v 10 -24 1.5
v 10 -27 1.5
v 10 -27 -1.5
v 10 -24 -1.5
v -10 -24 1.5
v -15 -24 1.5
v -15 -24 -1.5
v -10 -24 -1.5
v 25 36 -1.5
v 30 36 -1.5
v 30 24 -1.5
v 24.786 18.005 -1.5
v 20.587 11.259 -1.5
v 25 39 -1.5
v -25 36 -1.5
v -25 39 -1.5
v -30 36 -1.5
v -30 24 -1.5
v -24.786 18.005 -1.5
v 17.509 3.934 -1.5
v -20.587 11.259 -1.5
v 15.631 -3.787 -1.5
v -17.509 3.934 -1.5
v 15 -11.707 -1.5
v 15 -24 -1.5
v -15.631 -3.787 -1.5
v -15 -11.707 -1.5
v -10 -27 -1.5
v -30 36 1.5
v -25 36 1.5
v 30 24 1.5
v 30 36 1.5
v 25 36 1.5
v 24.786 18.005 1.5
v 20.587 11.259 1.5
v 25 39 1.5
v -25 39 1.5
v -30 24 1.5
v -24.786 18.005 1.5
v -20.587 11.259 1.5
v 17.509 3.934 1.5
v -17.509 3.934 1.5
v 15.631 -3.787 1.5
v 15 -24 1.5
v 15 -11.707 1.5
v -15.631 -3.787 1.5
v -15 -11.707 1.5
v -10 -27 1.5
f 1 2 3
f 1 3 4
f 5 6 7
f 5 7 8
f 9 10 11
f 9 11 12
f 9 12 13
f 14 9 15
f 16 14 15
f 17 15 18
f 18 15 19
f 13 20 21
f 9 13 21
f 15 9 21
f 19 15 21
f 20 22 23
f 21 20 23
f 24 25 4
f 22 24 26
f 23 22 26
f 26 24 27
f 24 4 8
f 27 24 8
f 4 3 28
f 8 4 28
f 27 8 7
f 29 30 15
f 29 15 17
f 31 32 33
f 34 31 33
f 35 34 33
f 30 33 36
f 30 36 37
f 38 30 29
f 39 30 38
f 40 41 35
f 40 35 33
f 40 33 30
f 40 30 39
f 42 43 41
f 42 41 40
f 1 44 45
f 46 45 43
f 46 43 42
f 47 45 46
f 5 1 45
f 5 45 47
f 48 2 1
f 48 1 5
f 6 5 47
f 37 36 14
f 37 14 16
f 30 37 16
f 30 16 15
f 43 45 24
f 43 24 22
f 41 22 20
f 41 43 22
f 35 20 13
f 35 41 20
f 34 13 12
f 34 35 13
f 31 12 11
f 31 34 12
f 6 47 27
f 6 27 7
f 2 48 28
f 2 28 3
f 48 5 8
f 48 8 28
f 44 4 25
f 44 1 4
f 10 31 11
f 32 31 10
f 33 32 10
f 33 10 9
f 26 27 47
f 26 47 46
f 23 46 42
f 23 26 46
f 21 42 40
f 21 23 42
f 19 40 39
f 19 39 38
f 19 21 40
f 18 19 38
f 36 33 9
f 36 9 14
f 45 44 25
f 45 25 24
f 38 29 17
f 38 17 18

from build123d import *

# Parameters (mm, degrees)
BOSS_EXTRUDE1_DEPTH = 1.5
FILLET1_R           = 50


with BuildPart() as part:
    # Sketch2 → Boss-Extrude1 (new, symmetric)
    with BuildSketch(Plane.XY):
        Polygon((15, 24), (30, 24), (30, 36), (25, 36), (25, 39), (-25, 39), (-25, 36), (-30, 36), (-30, 24), (-15, 24), (-15, -24), (-10, -24), (-10, -27), (10, -27), (10, -24), (15, -24), align=None)
    extrude(amount=BOSS_EXTRUDE1_DEPTH, both=True)

    # Fillet1
    # the kernel refuses this fillet: 50 mm, written as the material it adds along each edge
    with BuildSketch(Plane(origin=(-15, 24, -1.5), x_dir=(0, -1, 0), z_dir=(0, 0, 1))) as fillet1_piece_1:
        with BuildLine():
            CenterArc((35.707142143, -50), FILLET1_R, 90, 45.572995999)
            Line((0, -15), (0, 0))
            Line((0, 0), (35.707142143, 0))
        make_face()
    extrude(amount=3)
    with BuildSketch(Plane(origin=(15, 24, 1.5), x_dir=(1, 0, 0), z_dir=(0, 0, -1))) as fillet1_piece_2:
        with BuildLine():
            CenterArc((50, 35.707142143), FILLET1_R, 180, 45.572995999)
            Line((0, 35.707142143), (0, 0))
            Line((0, 0), (15, 0))
        make_face()
    extrude(amount=3)


solid = part.part
